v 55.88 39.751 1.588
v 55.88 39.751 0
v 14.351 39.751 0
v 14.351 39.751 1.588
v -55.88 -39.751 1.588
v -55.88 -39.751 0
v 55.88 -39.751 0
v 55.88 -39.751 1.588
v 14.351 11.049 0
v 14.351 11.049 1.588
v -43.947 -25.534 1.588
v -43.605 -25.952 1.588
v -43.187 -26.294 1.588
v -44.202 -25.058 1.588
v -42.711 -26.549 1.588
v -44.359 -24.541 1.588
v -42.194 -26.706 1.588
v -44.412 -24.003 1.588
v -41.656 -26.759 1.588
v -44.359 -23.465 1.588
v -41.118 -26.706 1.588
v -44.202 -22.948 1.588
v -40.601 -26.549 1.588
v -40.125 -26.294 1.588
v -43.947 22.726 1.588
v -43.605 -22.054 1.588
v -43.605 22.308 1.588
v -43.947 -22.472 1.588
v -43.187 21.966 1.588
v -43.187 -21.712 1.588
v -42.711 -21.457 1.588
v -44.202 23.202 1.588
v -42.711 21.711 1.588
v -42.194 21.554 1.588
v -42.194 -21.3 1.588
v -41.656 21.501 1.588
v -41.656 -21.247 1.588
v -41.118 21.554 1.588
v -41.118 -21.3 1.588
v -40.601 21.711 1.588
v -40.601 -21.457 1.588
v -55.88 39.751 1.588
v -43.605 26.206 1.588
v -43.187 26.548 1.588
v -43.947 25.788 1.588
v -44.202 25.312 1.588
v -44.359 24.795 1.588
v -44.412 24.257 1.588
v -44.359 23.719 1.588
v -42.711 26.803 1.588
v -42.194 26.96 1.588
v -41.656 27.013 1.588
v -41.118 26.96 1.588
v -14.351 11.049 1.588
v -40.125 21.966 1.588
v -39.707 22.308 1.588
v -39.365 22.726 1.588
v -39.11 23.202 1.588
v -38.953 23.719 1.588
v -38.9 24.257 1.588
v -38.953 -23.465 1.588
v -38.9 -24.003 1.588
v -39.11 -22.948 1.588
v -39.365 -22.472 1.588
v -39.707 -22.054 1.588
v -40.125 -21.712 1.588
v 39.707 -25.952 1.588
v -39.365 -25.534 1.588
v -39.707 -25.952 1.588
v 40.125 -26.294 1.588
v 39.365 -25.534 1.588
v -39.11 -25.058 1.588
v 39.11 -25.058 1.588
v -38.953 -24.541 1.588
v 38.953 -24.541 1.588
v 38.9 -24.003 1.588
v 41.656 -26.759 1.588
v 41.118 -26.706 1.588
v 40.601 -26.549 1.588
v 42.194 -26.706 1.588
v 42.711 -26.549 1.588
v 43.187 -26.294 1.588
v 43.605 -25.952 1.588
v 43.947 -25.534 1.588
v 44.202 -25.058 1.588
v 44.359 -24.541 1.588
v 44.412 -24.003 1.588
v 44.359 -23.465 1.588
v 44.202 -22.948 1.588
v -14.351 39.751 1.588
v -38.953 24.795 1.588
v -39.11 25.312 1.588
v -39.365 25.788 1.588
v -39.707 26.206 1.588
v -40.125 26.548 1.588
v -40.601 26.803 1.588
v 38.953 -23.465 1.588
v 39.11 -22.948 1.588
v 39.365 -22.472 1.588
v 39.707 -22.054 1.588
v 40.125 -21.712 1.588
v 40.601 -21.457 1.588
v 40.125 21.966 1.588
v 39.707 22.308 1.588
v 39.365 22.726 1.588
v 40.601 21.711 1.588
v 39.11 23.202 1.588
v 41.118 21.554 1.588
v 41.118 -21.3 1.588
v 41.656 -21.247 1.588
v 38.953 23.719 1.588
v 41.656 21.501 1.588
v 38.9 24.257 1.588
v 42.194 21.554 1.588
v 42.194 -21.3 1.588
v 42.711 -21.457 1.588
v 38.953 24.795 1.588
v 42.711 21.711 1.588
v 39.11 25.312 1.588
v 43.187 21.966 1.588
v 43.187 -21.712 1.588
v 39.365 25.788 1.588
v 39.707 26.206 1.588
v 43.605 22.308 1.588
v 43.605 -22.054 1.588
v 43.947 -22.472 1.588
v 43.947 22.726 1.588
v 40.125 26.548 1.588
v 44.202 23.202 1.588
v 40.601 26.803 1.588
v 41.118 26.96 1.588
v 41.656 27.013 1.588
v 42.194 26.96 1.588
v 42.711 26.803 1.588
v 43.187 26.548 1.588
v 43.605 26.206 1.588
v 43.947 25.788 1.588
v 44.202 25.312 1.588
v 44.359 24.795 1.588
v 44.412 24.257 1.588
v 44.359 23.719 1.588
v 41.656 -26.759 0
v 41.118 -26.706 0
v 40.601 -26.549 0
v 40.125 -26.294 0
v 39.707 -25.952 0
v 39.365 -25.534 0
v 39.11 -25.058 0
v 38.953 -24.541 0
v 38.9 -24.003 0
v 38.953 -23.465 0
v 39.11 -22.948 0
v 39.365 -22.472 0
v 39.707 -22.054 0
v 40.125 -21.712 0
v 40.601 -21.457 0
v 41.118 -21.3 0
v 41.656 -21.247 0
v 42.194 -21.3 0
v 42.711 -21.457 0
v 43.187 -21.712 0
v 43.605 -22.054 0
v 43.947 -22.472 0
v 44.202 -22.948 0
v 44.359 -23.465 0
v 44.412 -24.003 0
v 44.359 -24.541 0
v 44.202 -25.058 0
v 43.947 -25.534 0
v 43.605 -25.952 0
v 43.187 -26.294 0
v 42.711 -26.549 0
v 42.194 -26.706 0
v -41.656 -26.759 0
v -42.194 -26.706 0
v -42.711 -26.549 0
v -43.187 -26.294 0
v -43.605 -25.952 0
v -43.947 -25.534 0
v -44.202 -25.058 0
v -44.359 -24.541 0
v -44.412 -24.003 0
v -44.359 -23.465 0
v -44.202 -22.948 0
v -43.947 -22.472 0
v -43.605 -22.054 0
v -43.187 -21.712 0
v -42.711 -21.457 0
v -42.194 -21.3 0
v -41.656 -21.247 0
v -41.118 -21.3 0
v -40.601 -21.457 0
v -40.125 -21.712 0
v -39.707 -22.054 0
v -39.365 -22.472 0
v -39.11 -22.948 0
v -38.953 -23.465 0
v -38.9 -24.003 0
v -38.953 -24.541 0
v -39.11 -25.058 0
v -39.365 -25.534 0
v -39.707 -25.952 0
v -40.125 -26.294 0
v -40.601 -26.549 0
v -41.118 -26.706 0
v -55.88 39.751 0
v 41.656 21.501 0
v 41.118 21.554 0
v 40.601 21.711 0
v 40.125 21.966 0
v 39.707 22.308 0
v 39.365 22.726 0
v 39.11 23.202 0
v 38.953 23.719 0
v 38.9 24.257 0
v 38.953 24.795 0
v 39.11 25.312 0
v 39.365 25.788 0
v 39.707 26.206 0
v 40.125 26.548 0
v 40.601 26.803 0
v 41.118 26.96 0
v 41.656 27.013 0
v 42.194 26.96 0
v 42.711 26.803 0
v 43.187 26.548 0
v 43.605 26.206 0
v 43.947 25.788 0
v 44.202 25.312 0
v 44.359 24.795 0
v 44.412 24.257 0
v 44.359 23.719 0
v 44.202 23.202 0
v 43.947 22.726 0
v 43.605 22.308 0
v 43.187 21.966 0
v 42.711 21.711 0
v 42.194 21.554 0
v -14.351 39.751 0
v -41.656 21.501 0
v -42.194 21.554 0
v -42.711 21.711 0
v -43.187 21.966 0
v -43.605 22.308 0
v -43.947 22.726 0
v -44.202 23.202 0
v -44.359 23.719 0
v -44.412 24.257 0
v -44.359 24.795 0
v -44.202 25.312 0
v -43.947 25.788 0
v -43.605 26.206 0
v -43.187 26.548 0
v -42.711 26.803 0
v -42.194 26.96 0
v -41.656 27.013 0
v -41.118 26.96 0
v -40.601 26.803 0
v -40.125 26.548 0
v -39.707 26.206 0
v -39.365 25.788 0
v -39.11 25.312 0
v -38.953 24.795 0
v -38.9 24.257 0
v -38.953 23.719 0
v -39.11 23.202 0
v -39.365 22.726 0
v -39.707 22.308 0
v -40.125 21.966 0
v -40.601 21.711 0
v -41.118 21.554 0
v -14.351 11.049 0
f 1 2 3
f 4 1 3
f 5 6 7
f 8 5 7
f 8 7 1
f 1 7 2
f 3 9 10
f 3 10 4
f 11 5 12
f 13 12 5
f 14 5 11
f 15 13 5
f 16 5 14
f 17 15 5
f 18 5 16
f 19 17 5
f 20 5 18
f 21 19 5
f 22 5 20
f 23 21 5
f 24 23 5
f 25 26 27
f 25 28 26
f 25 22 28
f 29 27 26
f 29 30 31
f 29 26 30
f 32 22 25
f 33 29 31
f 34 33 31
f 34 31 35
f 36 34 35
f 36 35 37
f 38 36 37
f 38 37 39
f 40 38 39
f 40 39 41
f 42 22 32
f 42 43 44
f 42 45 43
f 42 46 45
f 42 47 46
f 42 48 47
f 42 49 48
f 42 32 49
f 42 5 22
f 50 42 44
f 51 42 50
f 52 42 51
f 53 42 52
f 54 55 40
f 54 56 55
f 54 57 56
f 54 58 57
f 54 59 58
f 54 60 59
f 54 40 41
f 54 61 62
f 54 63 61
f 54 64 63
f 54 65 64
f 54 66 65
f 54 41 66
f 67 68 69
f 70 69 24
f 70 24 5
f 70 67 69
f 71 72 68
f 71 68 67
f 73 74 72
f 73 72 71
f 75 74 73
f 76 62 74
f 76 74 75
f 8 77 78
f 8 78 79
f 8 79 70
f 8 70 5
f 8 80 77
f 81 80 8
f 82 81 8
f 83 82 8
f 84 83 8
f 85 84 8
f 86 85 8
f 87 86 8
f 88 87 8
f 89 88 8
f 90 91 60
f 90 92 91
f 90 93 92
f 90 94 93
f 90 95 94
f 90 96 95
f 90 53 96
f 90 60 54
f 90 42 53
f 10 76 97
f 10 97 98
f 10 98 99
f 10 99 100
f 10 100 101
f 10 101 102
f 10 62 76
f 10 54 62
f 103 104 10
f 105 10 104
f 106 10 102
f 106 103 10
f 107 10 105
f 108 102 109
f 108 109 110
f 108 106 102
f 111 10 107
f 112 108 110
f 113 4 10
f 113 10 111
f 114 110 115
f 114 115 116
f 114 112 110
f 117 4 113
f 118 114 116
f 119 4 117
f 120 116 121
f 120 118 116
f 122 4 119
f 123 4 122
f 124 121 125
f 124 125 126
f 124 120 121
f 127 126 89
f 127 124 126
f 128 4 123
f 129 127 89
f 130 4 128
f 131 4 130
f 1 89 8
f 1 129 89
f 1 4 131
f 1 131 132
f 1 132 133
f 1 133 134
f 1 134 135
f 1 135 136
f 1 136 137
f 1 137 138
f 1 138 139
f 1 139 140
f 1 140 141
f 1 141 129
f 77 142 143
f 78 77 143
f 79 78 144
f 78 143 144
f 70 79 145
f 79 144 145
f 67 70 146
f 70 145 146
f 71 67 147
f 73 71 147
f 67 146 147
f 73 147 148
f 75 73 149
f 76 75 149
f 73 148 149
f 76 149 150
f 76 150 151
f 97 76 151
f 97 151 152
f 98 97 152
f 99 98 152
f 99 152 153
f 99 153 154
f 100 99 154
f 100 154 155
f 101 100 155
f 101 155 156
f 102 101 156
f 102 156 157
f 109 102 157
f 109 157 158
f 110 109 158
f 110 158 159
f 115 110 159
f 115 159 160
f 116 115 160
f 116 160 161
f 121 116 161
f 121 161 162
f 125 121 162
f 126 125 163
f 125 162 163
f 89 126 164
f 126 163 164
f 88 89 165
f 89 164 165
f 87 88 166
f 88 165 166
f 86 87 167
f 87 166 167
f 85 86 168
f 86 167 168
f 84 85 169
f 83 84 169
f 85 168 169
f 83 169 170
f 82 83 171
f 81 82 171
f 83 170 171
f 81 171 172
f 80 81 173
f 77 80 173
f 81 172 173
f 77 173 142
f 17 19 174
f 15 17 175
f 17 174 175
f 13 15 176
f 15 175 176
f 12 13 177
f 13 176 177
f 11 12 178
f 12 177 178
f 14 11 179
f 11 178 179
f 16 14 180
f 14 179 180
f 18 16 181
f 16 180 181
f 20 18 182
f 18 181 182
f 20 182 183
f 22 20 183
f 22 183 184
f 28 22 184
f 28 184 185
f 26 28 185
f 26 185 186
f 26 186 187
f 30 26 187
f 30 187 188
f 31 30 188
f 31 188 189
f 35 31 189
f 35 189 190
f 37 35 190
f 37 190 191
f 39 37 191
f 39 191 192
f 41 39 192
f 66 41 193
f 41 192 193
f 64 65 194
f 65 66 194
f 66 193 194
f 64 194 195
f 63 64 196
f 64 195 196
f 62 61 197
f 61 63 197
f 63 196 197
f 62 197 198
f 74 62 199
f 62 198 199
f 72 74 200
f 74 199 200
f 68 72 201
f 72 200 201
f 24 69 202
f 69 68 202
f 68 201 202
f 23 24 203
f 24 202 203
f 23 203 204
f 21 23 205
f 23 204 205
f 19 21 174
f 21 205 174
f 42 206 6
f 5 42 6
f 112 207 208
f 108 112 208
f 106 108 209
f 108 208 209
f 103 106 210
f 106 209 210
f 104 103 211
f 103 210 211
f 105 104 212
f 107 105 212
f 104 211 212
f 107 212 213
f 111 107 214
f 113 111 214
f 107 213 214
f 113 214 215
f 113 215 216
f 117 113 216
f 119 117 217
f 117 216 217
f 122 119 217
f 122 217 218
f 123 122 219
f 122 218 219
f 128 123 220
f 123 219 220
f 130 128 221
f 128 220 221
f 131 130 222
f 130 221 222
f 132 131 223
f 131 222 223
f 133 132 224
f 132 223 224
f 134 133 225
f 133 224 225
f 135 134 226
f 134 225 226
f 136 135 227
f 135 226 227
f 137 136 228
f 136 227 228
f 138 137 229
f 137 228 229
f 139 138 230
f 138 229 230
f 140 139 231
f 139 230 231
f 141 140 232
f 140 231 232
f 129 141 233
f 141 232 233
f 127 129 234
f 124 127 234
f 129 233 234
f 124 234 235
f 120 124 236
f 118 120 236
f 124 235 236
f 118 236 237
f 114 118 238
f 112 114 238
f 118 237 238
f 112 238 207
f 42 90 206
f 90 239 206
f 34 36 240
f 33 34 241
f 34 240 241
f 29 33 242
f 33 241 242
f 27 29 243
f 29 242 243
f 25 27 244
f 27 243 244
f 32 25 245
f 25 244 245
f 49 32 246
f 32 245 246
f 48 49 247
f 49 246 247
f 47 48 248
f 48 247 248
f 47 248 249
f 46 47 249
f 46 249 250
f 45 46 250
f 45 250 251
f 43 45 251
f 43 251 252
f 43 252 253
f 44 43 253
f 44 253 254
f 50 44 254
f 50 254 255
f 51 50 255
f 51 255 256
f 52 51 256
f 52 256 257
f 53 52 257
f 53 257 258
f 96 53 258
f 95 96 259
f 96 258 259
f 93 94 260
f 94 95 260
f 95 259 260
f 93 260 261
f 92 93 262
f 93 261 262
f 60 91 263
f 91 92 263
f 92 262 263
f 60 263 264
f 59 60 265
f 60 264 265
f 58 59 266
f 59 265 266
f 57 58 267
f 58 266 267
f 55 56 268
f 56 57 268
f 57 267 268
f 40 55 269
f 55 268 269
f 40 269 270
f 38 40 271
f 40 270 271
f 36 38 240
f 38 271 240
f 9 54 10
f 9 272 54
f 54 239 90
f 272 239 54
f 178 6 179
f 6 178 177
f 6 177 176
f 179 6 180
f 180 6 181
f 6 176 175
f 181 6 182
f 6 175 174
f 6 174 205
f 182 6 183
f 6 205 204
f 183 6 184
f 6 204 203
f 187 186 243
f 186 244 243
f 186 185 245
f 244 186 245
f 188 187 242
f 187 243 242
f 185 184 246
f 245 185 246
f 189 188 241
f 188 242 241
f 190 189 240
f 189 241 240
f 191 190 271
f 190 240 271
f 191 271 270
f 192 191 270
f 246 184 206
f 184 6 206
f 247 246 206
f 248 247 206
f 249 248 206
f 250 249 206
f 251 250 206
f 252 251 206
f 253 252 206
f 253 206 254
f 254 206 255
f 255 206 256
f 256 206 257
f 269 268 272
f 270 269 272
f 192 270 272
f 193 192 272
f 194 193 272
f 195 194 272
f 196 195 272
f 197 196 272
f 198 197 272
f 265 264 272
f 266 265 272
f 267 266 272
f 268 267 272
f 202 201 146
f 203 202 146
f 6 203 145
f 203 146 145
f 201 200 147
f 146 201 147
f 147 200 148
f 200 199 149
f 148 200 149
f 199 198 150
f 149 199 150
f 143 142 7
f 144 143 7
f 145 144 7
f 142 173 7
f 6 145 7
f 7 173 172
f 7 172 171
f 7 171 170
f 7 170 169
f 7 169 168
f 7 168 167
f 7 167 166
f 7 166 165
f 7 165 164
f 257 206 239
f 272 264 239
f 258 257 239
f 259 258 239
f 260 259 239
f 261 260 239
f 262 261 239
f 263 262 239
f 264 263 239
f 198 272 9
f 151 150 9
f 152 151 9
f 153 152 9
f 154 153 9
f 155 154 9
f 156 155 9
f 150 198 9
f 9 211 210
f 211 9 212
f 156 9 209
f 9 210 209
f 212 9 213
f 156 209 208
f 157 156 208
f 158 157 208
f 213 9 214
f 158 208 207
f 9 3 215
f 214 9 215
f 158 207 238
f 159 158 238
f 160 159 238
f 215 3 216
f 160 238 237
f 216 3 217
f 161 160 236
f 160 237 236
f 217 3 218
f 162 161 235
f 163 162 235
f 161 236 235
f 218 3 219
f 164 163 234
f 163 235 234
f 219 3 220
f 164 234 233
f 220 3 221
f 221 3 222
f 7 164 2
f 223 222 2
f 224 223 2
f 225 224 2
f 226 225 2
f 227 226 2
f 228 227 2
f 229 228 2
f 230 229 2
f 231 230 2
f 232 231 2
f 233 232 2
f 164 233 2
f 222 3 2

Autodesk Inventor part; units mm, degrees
ref_plane "YZ Plane" through (0, 0, 0) normal (1, 0, 0) x (0, 1, 0)
ref_plane "XZ Plane" through (0, 0, 0) normal (0, 1, 0) x (-1, 0, 0)
ref_plane "XY Plane" through (0, 0, 0) normal (0, 0, 1) x (1, 0, 0)
sketch "Sketch1" plane through (0, 0, 0) normal (0, 0, 1) x (1, 0, 0)
  line L0 (-55.88, 39.751) -> (-55.88, -39.751)
  line L1 (-55.88, 39.751) -> (23.622, 39.751) construction
  line L2 (-55.88, -39.751) -> (55.88, -39.751)
  line L3 (55.88, -39.751) -> (55.88, 39.751)
  line L4 (55.88, 39.751) -> (-55.88, 39.751)
  line L5 (0, -55.6514) -> (0, 55.6514) projected
  line L6 (-78.232, 0) -> (78.232, 0) projected
  line L7 (-14.351, 39.751) -> (-14.351, 11.049)
  line L8 (-14.351, 11.049) -> (14.351, 11.049)
  line L9 (14.351, 11.049) -> (14.351, 39.751)
  point P0 (0, 0)
  dimension "d0" = 79.502
  dimension "d1" = 90
  dimension "d2" = 111.76
  dimension "d3" = 28.702
  dimension "d4" = 28.702
extrude "Extrusion1" add sketch "Sketch1" along normal blind 1.5875 contours L4 L7 L8 L5 L6 L0 | L6 L5 L2 L0 | L6 L3 L2 L5 | L5 L8 L9 L4 L3 L6
sketch "Sketch2" plane through (-41.656, -2.7227, 1.5875) normal (0, 0, 1) x (1, 0, 0)
  line L0 (97.536, -37.0283) -> (97.536, 37.0283)
  line L1 (-14.224, -37.0283) -> (97.536, -37.0283)
  line L2 (97.536, -37.0283) -> (97.536, 42.4737) projected
  line L3 (-14.224, -37.0283) -> (97.536, -37.0283) projected
  point P0 (0, 0)
  point P1 (83.312, 26.9797)
  point P2 (83.312, -21.2803)
  point P3 (97.536, 0)
  point P4 (41.656, -37.0283)
  dimension "d10" = 48.26
  dimension "d11" = 14.224
  dimension "d9" = 14.224
  dimension "d8" = 15.748
hole "Hole1" at (41.656, 24.257, 1.5875) at (41.656, -24.003, 1.5875) direction (0, 0, -1) diameter 5.5118 end through all
mirror "Mirror1" about plane through (0, 0, 0) normal (1, 0, 0) of "Hole1"
properties part number "DIFF_HOUSING_NO"
